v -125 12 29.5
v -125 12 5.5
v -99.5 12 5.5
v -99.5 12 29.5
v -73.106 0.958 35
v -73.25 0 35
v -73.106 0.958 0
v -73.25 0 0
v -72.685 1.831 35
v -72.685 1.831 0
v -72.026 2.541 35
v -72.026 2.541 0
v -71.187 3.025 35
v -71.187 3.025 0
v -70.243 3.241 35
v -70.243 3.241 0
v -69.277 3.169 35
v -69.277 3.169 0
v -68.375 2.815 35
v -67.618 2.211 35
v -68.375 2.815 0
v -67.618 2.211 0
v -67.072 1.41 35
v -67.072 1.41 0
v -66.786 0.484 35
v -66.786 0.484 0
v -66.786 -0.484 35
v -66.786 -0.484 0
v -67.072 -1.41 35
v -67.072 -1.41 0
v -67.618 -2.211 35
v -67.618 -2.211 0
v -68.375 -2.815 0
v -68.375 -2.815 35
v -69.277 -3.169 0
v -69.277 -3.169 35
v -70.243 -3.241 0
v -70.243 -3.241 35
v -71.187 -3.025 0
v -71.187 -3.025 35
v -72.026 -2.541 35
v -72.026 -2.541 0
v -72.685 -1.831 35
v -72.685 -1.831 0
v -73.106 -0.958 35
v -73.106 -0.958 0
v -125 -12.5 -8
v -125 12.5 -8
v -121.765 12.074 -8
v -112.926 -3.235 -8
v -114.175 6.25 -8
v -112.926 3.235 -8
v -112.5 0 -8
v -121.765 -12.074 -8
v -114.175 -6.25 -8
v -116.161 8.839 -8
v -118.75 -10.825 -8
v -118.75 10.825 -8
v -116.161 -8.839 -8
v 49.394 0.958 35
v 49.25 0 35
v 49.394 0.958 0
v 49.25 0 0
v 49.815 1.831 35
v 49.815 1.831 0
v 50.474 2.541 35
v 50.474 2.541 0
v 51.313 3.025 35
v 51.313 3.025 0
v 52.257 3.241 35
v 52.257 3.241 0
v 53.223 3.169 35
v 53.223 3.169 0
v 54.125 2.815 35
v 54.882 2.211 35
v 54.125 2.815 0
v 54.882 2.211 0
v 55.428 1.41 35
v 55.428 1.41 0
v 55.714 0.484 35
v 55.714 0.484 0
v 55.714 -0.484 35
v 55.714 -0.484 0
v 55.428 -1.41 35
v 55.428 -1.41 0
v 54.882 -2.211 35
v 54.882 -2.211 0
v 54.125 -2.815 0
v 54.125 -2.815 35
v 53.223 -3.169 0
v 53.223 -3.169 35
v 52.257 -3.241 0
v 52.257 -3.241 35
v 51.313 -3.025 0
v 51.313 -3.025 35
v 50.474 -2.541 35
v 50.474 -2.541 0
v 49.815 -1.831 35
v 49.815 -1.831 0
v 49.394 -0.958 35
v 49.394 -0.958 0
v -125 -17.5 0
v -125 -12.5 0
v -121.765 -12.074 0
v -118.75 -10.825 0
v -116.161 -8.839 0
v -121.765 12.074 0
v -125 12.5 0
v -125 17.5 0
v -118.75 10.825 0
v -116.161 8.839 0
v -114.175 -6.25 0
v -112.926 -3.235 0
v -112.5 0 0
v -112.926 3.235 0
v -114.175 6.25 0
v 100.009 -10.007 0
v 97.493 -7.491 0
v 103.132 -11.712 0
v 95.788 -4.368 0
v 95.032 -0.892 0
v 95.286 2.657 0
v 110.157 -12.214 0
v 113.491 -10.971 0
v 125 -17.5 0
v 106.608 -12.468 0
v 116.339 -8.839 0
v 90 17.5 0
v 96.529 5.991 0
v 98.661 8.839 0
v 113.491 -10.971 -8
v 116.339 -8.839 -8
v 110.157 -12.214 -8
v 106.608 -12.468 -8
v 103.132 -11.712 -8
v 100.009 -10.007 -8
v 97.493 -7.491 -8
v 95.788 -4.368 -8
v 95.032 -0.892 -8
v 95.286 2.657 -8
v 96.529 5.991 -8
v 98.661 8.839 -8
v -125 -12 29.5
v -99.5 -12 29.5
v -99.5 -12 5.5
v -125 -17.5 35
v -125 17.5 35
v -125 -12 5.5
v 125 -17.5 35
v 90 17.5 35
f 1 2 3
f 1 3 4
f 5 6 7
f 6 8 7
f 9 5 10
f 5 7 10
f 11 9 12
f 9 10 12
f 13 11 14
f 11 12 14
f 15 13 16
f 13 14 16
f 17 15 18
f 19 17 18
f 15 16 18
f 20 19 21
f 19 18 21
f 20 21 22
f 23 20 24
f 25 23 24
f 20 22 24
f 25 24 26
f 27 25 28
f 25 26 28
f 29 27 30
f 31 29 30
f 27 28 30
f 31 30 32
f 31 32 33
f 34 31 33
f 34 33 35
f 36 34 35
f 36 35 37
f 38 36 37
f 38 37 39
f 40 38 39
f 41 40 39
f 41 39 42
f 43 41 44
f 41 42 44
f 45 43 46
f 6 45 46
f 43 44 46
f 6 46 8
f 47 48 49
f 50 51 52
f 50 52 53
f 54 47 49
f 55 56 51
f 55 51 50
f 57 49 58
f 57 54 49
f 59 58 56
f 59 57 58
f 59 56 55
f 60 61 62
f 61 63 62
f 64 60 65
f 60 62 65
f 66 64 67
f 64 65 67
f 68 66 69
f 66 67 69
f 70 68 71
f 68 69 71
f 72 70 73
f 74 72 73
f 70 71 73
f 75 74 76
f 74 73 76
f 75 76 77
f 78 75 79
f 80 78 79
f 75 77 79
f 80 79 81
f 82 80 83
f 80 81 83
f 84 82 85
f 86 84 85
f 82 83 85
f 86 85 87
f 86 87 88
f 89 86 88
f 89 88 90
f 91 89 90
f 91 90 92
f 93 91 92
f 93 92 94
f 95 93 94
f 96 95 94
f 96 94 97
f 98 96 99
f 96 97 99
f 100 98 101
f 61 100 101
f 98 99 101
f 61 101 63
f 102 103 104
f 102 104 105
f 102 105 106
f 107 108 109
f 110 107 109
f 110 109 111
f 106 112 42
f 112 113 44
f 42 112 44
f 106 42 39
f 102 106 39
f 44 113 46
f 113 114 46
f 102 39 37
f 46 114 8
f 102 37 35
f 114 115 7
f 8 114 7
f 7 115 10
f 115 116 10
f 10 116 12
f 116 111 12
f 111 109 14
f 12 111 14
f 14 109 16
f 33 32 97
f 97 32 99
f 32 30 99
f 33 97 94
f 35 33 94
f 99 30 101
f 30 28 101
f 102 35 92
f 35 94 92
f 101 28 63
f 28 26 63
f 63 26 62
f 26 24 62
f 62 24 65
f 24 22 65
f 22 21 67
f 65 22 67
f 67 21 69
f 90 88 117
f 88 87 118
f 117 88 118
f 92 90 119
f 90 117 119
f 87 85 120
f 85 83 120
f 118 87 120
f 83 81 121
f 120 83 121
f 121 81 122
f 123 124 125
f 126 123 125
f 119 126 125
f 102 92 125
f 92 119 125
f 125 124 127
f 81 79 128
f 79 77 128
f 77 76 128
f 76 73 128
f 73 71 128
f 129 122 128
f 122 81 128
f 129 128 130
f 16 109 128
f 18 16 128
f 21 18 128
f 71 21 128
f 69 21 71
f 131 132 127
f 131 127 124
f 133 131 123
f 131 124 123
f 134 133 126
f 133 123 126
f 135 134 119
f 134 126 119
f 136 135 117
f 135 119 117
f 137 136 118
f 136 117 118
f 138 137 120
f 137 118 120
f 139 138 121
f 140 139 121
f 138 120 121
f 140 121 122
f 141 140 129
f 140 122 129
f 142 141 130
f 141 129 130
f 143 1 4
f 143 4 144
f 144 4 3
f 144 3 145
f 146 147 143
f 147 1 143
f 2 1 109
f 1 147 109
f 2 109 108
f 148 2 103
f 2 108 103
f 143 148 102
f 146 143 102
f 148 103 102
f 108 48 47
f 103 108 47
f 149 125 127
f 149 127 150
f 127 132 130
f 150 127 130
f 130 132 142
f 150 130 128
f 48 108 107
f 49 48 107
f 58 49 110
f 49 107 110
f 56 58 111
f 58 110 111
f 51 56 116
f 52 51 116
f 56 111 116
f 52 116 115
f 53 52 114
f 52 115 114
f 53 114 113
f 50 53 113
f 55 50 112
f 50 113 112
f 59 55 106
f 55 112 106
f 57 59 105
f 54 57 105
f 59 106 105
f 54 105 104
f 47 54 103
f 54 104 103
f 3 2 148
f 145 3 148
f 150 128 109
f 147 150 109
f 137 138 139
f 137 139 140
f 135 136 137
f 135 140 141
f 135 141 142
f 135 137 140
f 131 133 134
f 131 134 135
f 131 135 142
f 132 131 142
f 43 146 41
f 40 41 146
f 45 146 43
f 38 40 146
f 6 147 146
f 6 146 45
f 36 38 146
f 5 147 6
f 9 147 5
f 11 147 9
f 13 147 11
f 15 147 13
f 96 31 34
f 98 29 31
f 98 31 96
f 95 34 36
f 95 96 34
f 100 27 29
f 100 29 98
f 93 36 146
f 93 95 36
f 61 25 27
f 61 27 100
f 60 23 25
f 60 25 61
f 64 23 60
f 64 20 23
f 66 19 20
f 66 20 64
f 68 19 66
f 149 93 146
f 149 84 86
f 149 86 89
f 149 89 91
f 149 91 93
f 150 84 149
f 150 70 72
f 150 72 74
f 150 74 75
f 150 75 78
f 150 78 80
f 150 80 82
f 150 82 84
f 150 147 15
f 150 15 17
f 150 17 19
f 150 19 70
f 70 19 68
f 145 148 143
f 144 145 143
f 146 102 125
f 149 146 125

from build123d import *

# Parameters (mm, degrees)
F1_DEPTH = 35
F2_W     = 24
F2_H     = 24
F3_DEPTH = 25.5
F5_D     = 6.5
F5_DEPTH = 35
F5_TIP   = 1.9527970118
F7_DEPTH = 8
F9_DEPTH = 8


with BuildPart() as f1:
    # F0 (on Top) → F1 (new body)
    with BuildSketch(Plane.XY):
        Polygon((-125, -17.5), (125, -17.5), (90, 17.5), (-125, 17.5), align=None)
    extrude(amount=F1_DEPTH)

    # F2 (on face) → F3 (cut)
    with BuildSketch(Plane(origin=(-125, 0, 0), x_dir=(0, -1, 0), z_dir=(-1, 0, 0))):
        with Locations((0, 17.5)):
            Rectangle(F2_W, F2_H)
    extrude(amount=-F3_DEPTH, mode=Mode.SUBTRACT)

    # F5
    with Locations(Plane.XY.offset(35)):
        with Locations((52.5, 0), (-70, 0)):
            Hole(F5_D / 2, depth=F5_DEPTH)
            with Locations((0, 0, -(F5_DEPTH + F5_TIP / 2))):  # 118° drill point
                Cone(0, F5_D / 2, F5_TIP, mode=Mode.SUBTRACT)

    # F6 (on face) → F7 (join)
    with BuildSketch(Plane(origin=(0, 0, 0), x_dir=(1, 0, 0), z_dir=(0, 0, -1))):
        with BuildLine():
            Line((98.6611652352, -8.8388347648), (116.3388347648, 8.8388347648))
            ThreePointArc((116.3388347648, 8.8388347648), (98.6611652352, 8.8388347648), (98.6611652352, -8.8388347648))
        make_face()
    extrude(amount=F7_DEPTH)

    # F8 (on face) → F9 (join)
    with BuildSketch(Plane(origin=(0, 0, 0), x_dir=(1, 0, 0), z_dir=(0, 0, -1))):
        with BuildLine():
            ThreePointArc((-125, -12.5), (-116.1611652352, -8.8388347648), (-112.5, 0))
            ThreePointArc((-112.5, 0), (-116.1611652352, 8.8388347648), (-125, 12.5))
            Line((-125, 12.5), (-125, -12.5))
        make_face()
    extrude(amount=F9_DEPTH)


solid = f1.part
